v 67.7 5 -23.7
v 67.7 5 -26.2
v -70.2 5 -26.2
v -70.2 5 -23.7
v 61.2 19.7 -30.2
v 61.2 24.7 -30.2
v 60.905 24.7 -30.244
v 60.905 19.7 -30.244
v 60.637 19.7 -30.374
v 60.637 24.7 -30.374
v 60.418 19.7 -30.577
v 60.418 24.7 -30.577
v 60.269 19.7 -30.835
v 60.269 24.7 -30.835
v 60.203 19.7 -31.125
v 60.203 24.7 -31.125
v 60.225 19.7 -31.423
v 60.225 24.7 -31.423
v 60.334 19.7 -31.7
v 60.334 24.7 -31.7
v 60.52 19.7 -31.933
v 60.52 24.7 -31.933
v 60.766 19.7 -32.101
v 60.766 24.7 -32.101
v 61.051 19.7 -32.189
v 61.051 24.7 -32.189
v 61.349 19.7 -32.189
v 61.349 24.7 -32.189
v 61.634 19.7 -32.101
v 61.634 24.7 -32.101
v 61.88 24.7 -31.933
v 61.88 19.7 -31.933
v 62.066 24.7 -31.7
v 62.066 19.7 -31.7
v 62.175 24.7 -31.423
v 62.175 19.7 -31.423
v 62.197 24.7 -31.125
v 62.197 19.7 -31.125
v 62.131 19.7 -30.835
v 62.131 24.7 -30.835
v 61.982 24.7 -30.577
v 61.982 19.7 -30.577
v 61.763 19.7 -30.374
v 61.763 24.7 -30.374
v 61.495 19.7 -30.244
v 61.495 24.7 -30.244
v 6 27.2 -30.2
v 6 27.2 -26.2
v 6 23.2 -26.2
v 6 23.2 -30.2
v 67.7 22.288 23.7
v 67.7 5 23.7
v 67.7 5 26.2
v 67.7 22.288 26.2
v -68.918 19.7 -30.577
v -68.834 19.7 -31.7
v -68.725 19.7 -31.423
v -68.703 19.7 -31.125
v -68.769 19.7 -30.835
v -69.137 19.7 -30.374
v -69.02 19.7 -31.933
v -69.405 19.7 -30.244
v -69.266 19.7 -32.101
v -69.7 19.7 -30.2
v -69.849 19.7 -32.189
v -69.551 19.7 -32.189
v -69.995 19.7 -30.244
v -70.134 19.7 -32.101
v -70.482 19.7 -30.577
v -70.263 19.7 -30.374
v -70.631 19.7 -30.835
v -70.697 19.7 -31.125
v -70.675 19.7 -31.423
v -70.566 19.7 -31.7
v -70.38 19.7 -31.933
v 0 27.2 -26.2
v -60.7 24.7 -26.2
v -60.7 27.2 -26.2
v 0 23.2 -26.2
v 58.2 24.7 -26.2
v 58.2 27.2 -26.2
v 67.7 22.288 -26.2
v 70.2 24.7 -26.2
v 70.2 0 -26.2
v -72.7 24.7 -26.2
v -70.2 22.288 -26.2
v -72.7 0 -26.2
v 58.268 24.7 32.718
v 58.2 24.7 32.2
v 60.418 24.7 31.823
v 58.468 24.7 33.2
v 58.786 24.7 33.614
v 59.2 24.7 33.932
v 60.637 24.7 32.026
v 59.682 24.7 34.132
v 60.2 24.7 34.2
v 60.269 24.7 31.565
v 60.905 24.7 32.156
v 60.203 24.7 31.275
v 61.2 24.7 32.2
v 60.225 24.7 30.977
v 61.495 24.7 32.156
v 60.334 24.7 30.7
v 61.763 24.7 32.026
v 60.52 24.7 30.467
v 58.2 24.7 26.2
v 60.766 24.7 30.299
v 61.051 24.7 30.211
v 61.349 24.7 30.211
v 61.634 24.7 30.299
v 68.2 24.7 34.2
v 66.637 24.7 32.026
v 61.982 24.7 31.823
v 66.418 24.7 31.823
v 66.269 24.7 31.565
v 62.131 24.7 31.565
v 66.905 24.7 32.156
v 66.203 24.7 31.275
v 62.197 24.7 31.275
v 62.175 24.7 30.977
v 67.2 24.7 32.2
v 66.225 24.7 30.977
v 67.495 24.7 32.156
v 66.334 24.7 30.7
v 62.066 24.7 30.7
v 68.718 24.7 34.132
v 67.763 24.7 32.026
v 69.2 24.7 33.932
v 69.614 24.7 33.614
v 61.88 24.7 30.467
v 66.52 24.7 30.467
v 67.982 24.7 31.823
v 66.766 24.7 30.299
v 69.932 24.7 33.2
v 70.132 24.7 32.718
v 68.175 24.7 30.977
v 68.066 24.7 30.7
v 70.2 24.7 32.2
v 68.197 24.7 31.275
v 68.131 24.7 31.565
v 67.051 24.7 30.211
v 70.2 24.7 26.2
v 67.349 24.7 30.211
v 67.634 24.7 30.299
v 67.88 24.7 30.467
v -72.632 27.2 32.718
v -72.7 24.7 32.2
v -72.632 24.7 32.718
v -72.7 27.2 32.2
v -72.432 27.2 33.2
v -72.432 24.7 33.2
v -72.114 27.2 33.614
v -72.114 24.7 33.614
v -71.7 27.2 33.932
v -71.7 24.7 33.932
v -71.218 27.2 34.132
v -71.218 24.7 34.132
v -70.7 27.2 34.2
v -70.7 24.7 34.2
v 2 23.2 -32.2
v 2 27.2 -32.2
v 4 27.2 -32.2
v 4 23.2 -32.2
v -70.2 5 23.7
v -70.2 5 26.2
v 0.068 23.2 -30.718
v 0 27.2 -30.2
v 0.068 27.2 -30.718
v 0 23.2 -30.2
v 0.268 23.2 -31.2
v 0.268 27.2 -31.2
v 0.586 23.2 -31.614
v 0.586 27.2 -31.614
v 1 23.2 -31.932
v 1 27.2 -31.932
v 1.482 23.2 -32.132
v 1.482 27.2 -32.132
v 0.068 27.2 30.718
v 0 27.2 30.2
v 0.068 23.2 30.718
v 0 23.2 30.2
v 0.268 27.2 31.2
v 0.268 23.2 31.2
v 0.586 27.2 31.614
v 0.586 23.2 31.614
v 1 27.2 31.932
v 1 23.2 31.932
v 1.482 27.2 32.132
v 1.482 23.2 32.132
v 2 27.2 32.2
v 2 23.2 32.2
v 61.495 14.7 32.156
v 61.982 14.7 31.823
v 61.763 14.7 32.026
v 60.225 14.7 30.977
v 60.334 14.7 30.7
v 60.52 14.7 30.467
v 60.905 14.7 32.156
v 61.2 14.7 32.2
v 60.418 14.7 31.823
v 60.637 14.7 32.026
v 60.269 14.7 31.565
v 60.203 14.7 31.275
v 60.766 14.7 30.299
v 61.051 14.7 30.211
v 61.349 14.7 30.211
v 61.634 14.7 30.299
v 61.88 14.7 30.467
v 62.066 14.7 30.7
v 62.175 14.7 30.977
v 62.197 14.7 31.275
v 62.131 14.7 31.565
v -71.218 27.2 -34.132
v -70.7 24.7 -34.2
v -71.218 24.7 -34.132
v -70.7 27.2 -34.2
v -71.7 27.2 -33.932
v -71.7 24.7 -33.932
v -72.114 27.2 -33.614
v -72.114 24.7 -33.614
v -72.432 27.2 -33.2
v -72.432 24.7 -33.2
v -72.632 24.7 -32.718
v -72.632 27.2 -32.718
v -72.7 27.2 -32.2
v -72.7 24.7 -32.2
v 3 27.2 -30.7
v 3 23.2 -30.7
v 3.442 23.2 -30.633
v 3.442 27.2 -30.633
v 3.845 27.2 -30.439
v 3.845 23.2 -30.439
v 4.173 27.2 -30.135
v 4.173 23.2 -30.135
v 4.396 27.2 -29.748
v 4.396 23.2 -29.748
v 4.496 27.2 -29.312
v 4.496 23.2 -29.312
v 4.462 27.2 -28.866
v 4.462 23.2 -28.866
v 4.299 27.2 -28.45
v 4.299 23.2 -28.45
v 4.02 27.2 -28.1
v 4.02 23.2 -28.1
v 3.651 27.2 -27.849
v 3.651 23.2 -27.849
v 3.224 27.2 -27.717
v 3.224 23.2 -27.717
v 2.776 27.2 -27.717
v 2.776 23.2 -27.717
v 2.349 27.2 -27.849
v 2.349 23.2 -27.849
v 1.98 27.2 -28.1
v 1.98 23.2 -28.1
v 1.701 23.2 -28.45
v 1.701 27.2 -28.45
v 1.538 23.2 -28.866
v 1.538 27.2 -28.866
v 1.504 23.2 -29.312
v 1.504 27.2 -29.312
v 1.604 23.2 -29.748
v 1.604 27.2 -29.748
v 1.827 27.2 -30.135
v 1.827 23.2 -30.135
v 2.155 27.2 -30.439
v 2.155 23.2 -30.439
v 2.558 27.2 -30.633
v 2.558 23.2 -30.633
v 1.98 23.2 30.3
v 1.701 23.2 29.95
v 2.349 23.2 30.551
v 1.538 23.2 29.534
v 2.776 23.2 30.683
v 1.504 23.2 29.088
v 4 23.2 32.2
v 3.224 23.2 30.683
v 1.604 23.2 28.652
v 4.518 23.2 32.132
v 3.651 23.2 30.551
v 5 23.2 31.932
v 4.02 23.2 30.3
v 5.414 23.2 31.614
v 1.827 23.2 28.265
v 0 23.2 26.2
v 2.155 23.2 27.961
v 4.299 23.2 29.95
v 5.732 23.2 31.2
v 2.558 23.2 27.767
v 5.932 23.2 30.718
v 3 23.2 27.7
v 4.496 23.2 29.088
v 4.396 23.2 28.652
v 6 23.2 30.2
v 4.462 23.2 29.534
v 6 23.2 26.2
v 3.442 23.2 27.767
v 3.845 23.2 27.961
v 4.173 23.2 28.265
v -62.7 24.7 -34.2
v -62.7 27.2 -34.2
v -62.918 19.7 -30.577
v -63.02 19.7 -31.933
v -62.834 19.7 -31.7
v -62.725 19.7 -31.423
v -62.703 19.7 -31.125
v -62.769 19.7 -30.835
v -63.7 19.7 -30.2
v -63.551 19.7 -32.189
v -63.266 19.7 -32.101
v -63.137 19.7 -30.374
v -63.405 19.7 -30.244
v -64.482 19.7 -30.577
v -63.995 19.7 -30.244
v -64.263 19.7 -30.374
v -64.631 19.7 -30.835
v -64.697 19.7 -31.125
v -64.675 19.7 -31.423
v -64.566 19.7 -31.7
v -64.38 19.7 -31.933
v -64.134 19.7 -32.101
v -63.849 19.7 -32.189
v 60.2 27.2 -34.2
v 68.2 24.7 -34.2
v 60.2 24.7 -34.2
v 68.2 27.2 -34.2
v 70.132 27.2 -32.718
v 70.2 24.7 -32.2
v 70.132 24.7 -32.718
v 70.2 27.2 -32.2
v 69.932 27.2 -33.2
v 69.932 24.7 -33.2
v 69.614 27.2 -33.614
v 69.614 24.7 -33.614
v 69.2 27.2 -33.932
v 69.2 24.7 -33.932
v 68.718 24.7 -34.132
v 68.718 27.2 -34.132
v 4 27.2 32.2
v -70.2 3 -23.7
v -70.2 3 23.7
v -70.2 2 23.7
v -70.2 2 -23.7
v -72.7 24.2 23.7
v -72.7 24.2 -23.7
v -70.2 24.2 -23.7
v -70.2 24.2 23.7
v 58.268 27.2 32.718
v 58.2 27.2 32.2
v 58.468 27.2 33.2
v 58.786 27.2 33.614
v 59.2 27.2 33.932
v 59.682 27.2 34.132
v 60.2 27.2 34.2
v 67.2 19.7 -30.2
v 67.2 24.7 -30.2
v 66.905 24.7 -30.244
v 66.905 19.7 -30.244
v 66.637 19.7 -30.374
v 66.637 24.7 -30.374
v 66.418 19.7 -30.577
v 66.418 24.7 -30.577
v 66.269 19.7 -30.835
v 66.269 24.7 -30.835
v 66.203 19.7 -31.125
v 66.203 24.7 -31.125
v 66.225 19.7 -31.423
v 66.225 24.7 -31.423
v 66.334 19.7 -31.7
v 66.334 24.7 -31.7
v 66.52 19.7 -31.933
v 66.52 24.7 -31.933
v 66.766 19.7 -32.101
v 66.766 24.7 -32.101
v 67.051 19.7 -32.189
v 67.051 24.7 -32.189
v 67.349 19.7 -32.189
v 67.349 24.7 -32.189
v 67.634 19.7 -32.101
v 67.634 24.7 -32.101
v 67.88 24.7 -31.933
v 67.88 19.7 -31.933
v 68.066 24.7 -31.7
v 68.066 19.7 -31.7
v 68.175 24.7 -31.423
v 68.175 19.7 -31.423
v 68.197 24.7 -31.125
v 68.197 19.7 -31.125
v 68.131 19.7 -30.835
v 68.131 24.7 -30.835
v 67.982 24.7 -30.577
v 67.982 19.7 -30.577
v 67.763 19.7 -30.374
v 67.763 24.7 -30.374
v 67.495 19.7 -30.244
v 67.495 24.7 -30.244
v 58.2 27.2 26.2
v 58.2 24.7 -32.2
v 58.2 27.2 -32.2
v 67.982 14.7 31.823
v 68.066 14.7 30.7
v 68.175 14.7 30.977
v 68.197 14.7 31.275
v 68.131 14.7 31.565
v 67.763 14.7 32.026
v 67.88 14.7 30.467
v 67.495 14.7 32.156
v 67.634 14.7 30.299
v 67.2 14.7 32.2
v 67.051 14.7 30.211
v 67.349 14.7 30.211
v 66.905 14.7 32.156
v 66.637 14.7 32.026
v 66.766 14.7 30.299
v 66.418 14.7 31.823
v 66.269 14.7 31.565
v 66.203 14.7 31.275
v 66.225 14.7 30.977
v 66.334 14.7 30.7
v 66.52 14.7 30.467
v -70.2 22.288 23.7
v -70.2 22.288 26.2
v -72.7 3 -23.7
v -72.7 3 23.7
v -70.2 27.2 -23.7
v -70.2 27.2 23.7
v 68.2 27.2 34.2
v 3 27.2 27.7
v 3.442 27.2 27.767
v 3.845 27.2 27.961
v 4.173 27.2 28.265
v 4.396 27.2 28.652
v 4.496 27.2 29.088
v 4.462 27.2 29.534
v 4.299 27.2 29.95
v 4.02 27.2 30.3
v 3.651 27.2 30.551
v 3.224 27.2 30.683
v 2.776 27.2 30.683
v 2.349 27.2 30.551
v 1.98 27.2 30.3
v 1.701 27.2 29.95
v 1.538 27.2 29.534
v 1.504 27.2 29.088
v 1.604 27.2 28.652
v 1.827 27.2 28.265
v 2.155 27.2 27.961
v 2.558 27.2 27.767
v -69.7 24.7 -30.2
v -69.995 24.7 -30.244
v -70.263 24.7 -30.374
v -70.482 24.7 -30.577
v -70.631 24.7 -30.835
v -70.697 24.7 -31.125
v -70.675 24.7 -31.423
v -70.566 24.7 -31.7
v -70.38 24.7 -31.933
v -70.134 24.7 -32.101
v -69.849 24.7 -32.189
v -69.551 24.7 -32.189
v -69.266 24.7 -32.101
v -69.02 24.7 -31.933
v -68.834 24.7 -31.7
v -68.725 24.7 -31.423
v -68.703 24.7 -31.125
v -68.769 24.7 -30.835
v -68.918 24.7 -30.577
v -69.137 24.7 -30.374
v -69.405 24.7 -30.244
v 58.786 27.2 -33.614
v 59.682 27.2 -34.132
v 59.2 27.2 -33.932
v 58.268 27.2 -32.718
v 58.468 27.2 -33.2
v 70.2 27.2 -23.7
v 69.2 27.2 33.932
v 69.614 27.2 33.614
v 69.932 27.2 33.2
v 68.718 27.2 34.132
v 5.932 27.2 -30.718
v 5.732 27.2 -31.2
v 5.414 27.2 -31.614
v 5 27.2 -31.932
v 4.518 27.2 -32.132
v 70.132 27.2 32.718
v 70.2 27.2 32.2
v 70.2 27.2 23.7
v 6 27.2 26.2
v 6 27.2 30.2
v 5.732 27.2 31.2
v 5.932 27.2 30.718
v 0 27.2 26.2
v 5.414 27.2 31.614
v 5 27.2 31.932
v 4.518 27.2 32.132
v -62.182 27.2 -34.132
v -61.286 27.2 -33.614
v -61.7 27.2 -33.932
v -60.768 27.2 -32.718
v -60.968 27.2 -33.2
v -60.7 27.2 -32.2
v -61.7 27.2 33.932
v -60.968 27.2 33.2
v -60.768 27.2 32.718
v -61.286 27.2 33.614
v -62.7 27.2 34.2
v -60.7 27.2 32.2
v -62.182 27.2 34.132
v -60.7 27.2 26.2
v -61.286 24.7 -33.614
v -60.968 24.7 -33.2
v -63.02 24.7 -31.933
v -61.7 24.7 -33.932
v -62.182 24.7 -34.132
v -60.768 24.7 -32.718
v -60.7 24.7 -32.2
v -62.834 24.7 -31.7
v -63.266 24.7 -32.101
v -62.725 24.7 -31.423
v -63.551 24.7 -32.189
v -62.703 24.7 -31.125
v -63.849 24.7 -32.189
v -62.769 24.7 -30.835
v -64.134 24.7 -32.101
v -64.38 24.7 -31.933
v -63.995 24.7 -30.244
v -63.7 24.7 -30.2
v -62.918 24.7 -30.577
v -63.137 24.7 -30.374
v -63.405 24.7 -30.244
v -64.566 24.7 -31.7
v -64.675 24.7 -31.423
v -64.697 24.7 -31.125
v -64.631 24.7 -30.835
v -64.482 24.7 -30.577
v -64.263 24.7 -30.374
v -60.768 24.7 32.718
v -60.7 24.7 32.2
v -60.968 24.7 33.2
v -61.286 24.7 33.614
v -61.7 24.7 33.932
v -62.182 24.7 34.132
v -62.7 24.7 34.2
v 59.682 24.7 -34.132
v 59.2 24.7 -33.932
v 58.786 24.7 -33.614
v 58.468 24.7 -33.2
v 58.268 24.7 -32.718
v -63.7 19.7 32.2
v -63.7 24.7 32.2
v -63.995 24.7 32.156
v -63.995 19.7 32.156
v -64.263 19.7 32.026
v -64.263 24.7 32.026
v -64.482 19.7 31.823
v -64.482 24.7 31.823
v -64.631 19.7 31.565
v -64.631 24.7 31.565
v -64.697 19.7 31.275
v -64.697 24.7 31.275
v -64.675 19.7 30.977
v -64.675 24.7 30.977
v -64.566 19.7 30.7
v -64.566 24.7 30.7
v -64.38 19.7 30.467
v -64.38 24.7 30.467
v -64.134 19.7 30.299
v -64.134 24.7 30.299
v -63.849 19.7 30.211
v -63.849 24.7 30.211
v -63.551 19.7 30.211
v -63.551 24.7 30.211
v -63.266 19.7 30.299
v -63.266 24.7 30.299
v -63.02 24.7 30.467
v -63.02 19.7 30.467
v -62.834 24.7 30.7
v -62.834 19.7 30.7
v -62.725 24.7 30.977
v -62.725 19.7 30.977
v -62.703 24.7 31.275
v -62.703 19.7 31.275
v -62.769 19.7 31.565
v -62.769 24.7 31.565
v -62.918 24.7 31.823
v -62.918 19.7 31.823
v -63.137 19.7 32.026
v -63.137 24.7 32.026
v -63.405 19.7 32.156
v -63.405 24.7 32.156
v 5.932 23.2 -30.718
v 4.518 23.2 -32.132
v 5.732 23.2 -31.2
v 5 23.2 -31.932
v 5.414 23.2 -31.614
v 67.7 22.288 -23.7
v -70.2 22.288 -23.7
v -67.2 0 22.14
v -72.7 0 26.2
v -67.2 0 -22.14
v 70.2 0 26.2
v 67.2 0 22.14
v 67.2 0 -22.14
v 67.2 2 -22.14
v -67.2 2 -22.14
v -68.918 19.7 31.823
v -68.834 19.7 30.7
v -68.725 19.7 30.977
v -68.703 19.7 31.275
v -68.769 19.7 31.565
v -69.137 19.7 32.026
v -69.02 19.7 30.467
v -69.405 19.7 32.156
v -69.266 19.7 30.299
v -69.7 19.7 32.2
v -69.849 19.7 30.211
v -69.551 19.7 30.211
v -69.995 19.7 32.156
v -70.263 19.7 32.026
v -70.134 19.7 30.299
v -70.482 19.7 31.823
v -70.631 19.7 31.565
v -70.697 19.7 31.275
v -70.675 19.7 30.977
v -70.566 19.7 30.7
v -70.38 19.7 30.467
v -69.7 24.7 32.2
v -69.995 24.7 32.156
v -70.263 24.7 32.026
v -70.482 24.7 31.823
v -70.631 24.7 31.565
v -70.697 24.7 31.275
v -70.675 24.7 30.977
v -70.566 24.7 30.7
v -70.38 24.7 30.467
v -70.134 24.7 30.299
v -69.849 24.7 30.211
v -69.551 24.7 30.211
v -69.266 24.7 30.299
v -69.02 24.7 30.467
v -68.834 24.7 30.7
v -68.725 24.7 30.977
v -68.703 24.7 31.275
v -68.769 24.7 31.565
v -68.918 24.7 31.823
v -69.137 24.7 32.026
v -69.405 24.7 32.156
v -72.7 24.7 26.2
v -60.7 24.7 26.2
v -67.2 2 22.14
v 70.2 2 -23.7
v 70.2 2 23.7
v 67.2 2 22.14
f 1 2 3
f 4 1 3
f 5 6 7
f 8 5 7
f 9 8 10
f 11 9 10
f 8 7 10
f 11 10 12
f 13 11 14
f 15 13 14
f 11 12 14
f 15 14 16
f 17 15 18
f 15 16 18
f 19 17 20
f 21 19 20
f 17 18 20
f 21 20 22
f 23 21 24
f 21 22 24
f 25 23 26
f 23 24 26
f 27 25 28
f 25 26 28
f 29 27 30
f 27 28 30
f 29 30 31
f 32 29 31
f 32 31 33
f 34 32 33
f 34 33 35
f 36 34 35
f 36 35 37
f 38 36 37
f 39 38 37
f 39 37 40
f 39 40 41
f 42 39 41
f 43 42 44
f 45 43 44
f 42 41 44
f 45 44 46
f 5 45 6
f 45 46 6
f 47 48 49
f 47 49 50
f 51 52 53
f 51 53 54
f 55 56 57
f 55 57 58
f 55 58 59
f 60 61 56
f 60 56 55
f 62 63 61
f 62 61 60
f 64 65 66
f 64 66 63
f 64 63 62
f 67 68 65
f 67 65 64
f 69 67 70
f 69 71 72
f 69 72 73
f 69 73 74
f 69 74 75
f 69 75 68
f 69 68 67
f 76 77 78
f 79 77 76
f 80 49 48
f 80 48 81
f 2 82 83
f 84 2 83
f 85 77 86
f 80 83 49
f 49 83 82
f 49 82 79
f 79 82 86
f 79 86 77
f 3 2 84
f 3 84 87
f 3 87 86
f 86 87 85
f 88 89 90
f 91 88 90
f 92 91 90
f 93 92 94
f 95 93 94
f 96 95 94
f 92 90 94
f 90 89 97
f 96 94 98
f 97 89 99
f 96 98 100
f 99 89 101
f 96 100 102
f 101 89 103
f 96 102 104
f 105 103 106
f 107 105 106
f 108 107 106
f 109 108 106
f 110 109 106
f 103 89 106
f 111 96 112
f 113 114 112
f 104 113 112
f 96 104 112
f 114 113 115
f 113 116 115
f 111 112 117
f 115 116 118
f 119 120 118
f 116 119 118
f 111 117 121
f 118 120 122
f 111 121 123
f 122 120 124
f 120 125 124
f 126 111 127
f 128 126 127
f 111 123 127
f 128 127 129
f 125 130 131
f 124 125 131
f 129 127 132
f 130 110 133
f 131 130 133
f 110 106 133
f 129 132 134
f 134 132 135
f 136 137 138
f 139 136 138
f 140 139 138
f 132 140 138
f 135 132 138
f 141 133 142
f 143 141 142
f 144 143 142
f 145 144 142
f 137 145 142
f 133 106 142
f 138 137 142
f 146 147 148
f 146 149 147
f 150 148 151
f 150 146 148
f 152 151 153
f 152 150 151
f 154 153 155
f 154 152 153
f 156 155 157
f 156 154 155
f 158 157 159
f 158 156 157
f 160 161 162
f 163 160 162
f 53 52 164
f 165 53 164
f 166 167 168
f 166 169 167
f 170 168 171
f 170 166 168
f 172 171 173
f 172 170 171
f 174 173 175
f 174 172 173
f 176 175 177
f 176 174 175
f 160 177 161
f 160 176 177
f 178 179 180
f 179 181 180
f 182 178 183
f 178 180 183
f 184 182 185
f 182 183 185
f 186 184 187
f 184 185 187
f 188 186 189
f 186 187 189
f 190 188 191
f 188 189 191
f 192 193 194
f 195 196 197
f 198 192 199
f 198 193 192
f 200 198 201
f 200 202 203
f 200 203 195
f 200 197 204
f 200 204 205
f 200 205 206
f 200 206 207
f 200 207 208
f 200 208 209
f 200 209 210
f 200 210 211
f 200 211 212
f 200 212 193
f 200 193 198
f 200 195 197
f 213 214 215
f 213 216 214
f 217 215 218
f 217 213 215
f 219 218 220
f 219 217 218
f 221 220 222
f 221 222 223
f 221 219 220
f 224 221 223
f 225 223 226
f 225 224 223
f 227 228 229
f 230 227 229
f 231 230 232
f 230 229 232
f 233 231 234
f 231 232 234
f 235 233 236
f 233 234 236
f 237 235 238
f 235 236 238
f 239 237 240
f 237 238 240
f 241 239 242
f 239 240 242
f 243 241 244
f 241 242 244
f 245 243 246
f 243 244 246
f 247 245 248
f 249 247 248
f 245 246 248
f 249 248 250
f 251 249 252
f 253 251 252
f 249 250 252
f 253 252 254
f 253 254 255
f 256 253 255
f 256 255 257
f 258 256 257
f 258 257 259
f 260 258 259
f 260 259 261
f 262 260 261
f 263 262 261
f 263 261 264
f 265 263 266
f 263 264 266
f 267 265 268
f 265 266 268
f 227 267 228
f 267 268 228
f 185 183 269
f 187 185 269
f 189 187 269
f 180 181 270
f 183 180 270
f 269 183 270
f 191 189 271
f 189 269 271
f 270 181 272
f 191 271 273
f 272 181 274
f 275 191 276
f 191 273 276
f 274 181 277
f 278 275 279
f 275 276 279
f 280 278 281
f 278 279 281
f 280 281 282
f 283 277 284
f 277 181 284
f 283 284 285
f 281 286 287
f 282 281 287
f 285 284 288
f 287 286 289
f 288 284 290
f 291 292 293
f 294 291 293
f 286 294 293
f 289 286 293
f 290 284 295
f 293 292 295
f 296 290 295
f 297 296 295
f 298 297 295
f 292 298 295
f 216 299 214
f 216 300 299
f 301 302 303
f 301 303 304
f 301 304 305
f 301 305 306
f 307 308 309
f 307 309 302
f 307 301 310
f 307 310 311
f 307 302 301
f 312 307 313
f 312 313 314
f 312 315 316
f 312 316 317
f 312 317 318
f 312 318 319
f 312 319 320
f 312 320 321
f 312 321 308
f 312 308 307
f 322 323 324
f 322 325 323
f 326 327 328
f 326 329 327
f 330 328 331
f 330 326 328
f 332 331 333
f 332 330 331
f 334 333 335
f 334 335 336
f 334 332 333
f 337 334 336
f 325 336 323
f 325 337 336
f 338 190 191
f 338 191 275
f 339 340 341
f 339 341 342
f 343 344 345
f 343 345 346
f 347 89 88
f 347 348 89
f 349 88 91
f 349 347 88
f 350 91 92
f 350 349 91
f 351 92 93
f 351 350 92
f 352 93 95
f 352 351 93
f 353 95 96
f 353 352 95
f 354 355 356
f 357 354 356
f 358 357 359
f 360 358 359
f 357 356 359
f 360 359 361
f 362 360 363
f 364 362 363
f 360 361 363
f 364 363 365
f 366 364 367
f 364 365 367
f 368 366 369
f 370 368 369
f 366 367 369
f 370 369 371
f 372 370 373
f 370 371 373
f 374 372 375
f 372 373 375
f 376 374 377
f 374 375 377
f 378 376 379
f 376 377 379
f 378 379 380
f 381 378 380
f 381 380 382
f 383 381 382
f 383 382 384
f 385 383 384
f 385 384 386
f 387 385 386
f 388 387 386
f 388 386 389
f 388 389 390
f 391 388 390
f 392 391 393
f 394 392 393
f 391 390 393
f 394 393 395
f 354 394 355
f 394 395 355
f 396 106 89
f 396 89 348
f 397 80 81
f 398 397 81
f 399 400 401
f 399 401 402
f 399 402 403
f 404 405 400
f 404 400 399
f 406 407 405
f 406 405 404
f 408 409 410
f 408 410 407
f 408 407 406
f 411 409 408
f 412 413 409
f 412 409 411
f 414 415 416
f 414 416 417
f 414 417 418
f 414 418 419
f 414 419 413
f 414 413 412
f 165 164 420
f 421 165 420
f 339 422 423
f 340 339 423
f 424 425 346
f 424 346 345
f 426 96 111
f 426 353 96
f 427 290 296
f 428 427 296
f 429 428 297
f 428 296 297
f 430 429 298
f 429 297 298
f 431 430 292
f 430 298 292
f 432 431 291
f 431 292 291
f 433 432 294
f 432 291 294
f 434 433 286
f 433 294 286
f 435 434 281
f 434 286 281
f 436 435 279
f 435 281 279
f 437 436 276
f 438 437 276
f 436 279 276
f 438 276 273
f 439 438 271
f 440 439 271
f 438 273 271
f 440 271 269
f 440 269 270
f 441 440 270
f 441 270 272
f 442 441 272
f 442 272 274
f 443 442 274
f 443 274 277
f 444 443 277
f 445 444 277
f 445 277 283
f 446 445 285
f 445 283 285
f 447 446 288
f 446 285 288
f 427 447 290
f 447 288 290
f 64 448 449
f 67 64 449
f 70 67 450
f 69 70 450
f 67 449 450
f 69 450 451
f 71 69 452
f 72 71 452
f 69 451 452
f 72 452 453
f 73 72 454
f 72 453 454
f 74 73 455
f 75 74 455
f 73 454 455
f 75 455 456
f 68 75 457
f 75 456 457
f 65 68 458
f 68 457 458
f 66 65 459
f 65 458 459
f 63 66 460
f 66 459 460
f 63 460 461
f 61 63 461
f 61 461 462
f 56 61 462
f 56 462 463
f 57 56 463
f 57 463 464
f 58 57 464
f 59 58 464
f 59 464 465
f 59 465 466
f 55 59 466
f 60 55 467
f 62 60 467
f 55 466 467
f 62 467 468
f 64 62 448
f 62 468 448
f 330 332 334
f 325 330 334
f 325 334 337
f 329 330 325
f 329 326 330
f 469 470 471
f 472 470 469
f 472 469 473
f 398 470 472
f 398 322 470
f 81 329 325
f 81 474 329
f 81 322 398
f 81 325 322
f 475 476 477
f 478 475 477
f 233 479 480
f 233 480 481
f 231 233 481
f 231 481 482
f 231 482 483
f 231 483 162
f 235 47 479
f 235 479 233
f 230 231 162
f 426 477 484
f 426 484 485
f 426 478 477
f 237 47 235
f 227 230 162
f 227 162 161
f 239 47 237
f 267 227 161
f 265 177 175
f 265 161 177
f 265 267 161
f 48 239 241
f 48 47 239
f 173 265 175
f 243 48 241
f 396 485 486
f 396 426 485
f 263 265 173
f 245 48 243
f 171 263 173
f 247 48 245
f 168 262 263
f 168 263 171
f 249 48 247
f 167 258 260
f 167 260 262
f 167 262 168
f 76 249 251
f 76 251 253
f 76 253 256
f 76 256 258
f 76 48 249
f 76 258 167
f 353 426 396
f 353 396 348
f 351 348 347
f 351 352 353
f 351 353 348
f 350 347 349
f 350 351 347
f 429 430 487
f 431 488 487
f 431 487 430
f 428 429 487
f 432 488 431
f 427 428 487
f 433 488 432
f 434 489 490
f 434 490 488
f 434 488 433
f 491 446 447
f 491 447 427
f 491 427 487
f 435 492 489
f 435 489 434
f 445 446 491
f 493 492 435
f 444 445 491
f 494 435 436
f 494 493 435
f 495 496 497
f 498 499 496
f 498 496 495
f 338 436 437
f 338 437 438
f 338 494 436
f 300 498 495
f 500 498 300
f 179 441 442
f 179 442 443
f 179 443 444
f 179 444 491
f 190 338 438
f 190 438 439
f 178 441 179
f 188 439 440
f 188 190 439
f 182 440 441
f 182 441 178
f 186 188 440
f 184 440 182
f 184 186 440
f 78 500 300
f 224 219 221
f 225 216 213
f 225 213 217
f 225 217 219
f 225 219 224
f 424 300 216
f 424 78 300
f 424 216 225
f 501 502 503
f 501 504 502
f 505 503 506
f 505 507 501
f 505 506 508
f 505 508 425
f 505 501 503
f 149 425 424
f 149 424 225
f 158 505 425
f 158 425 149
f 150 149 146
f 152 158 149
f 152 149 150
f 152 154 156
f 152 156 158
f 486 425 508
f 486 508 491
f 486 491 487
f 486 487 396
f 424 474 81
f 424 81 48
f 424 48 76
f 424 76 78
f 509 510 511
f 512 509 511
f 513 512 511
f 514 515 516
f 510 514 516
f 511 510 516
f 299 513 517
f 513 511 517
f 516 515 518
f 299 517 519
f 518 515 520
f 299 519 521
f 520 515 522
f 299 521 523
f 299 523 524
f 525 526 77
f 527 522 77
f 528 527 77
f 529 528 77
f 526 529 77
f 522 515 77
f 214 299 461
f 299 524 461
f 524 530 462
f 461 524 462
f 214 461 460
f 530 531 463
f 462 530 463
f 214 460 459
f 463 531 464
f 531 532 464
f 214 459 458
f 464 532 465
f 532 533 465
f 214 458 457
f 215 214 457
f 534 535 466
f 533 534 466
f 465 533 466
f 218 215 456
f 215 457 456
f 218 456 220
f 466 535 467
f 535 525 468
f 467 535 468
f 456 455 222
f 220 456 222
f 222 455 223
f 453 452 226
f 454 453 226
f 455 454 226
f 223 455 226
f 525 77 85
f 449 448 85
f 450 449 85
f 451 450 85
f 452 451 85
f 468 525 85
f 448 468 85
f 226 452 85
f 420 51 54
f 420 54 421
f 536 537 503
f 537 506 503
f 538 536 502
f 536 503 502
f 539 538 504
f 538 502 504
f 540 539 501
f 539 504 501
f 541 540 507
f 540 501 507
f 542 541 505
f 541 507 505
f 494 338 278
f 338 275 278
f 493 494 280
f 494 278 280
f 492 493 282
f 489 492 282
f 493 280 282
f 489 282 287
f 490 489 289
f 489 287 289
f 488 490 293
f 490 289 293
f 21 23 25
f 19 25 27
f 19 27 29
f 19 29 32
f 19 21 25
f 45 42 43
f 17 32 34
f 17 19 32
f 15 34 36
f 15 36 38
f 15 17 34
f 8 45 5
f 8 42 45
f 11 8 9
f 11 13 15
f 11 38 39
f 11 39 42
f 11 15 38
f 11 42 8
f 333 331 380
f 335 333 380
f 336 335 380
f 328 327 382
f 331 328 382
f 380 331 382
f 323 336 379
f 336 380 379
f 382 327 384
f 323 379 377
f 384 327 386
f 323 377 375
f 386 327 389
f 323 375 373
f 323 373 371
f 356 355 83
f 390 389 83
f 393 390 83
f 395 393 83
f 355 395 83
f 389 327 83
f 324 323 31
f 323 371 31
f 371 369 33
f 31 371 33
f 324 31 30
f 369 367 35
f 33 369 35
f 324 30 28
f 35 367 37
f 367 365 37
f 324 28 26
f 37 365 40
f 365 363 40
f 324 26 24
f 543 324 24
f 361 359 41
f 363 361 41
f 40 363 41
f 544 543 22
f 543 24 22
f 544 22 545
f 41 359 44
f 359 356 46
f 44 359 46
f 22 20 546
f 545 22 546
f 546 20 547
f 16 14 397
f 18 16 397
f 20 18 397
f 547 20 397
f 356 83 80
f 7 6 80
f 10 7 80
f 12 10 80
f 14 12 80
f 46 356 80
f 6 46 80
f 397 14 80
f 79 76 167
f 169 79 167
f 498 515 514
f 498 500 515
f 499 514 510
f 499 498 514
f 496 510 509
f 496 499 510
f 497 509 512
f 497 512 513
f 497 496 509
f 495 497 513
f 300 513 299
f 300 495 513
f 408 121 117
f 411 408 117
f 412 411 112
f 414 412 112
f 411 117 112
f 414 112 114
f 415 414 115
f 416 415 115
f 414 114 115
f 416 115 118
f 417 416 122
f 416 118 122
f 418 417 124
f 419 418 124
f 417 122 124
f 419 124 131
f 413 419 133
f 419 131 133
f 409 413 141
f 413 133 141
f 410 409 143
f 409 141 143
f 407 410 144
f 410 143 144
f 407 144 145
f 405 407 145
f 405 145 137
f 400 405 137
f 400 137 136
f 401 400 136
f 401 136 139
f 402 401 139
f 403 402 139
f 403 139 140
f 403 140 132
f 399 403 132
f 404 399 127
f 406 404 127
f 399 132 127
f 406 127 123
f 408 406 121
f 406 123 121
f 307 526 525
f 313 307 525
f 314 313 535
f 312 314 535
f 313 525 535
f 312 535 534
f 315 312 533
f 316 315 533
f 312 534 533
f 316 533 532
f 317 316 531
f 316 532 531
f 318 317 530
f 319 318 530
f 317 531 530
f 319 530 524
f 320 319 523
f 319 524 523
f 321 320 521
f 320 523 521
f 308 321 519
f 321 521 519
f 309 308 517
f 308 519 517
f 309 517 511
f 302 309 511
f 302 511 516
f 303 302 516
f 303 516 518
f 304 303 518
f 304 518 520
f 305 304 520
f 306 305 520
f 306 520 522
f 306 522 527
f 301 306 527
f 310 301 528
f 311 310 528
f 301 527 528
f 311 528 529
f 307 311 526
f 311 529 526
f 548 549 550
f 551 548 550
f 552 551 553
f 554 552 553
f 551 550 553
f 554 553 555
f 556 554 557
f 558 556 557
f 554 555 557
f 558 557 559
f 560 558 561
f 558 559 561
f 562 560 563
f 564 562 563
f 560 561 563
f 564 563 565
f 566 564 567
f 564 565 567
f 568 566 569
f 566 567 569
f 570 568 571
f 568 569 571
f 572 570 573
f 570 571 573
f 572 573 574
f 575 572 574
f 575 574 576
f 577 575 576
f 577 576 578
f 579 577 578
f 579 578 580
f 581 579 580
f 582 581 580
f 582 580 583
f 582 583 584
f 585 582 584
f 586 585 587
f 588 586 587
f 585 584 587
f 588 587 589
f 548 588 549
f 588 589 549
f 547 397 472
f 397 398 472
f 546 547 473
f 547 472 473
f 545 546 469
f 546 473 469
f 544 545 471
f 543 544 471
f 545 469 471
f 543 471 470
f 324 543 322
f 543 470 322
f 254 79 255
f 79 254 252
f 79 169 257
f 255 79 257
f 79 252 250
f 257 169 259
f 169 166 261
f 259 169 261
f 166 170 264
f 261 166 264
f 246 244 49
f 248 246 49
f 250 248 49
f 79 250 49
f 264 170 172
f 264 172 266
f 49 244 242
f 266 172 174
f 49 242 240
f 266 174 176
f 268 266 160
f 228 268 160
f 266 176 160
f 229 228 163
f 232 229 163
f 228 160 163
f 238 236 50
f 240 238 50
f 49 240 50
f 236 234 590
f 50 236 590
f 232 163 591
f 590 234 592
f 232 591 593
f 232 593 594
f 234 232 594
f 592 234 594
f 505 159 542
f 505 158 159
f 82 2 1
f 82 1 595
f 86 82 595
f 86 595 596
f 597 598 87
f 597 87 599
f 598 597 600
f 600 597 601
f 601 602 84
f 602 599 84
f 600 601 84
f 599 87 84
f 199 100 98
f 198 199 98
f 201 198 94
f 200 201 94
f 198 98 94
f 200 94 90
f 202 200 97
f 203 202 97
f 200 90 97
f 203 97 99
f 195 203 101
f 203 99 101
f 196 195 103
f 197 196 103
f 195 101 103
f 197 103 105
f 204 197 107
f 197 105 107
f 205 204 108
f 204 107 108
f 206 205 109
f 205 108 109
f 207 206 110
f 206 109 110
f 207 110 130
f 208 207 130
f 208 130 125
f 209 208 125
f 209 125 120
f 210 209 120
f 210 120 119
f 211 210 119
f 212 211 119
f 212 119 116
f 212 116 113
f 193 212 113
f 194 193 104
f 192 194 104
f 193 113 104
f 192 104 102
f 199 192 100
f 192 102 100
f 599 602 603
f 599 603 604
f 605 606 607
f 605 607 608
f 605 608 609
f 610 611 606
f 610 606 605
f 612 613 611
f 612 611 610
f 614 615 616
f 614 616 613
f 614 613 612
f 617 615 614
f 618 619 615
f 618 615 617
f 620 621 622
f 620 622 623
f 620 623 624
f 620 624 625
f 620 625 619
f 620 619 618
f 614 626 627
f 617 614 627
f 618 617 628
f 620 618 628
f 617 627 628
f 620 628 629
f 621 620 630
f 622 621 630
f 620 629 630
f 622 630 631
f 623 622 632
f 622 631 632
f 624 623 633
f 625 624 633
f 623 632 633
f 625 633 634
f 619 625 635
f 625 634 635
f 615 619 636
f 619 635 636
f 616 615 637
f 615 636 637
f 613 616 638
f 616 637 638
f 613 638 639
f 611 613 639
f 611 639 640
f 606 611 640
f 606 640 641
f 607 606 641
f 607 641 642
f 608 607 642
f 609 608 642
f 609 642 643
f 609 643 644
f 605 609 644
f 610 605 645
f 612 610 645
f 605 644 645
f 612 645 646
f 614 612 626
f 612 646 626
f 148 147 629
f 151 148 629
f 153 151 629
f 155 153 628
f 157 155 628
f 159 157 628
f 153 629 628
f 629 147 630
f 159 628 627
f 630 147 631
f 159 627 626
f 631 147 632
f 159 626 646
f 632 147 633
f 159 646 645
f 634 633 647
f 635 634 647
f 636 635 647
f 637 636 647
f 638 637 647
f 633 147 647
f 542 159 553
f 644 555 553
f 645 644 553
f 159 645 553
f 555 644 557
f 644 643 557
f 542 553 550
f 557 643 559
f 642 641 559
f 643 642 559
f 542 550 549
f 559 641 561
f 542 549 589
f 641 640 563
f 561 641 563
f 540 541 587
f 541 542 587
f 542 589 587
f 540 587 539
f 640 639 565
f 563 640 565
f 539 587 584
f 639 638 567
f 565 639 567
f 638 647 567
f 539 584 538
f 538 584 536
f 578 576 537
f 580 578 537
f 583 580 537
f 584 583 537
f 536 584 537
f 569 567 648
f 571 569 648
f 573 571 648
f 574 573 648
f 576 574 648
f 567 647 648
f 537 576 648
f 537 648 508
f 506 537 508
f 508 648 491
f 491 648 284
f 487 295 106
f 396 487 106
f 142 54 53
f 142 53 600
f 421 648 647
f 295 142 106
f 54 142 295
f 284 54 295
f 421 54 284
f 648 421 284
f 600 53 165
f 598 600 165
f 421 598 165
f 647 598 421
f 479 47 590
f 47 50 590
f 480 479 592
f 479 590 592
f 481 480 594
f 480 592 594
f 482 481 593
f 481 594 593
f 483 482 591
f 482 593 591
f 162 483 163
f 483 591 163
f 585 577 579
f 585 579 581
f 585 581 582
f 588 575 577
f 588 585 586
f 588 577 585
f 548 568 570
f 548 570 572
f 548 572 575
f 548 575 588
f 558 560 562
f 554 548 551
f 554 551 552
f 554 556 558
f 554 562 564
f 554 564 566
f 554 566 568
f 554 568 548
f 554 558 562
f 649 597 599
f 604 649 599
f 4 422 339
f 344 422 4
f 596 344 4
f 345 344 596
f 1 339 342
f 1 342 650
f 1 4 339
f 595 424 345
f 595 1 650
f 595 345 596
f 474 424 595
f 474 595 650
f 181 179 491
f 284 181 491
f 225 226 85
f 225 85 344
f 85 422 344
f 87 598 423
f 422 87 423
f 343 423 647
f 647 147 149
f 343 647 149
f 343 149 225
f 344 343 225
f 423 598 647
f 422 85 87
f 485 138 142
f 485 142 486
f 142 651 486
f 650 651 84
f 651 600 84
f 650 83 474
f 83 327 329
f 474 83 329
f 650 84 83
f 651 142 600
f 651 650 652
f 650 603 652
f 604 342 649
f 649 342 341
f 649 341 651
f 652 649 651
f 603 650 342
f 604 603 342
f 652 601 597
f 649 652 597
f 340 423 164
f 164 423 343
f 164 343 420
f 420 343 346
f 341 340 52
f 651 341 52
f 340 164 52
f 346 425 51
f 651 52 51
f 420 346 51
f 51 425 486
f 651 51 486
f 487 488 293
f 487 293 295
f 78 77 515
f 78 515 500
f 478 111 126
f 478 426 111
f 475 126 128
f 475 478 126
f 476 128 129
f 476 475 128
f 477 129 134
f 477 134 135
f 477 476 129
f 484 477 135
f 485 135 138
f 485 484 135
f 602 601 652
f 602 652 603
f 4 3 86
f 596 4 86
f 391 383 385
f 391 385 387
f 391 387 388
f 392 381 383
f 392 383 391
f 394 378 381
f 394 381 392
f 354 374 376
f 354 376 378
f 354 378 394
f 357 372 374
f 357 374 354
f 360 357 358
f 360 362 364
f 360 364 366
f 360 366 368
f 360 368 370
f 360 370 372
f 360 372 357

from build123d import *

# Parameters (mm, degrees)
SKETCH1_W            = 145.4
SKETCH1_H            = 52.4
BOSS_EXTRUDE1_DEPTH  = 27.2
SKETCH2_W            = 140.4
SKETCH2_H            = 47.4
CUT_EXTRUDE1_DEPTH   = 25.2
SKETCH3_W            = 46.4
SKETCH3_H            = 25.2
CUT_EXTRUDE2_DEPTH   = 25.2
SKETCH4_W            = 6
SKETCH4_H            = 6
BOSS_EXTRUDE2_DEPTH  = 4
FILLET1_R            = 2
FILLET2_R            = 2
SKETCH7_R            = 1.5
CUT_EXTRUDE4_DEPTH   = 4
SKETCH8_W            = 2.5
SKETCH8_H            = 52.4
CUT_EXTRUDE5_DEPTH   = 43
SKETCH9_W            = 47.4
SKETCH9_H            = 21.2
CUT_EXTRUDE6_DEPTH   = 43
SKETCH11_W           = 137.9
SKETCH11_H           = 17.288060203
CUT_EXTRUDE7_DEPTH   = 59
SKETCH12_W           = 134.4
SKETCH12_H           = 44.280487354
CUT_EXTRUDE8_DEPTH   = 10
SKETCH16_W           = 12
SKETCH16_H           = 2.5
BOSS_EXTRUDE4_DEPTH  = 8
FILLET3_R            = 2
SKETCH17_R           = 1
BOSS_EXTRUDE5_DEPTH  = 5
SKETCH18_W           = 12
SKETCH18_H           = 2.5
BOSS_EXTRUDE6_DEPTH  = 8
FILLET4_R            = 2
SKETCH19_R           = 1
BOSS_EXTRUDE7_DEPTH  = 10
SKETCH20_W           = 12
SKETCH20_H           = 2.5
BOSS_EXTRUDE8_DEPTH  = 8
FILLET5_R            = 2
SKETCH21_R           = 1
BOSS_EXTRUDE9_DEPTH  = 5
SKETCH22_W           = 12
SKETCH22_H           = 2.5
BOSS_EXTRUDE10_DEPTH = 8
FILLET6_R            = 2
SKETCH23_R           = 1
BOSS_EXTRUDE11_DEPTH = 5


with BuildPart() as part:
    # Sketch1 → Boss-Extrude1 (new body)
    with BuildSketch(Plane(origin=(0, 0, 0), x_dir=(1, 0, 0), z_dir=(0, 1, 0))):
        Rectangle(SKETCH1_W, SKETCH1_H)
    extrude(amount=BOSS_EXTRUDE1_DEPTH)

    # Sketch2 → Cut-Extrude1 (cut)
    with BuildSketch(Plane(origin=(0, 27.2, 0), x_dir=(1, 0, 0), z_dir=(0, 1, 0))):
        Rectangle(SKETCH2_W, SKETCH2_H)
    extrude(amount=-CUT_EXTRUDE1_DEPTH, mode=Mode.SUBTRACT)

    # Sketch3 → Cut-Extrude2 (cut)
    with BuildSketch(Plane.ZY.offset(-70.2)):
        with Locations((0.5, 14.6)):
            Rectangle(SKETCH3_W, SKETCH3_H)
    extrude(amount=-CUT_EXTRUDE2_DEPTH, mode=Mode.SUBTRACT)

    # Sketch4 → Boss-Extrude2 (add)
    with BuildSketch(Plane(origin=(0, 27.2, 0), x_dir=(1, 0, 0), z_dir=(0, 1, 0))):
        with Locations((3, -29.2)):
            Rectangle(SKETCH4_W, SKETCH4_H)
        with Locations((3, 29.2)):
            Rectangle(SKETCH4_W, SKETCH4_H)
    extrude(amount=-BOSS_EXTRUDE2_DEPTH)

    # Fillet1
    fillet1_edges = [part.edges().sort_by_distance(p)[0] for p in [
        (0, 25.2, -32.2),
        (6, 25.2, -32.2),
    ]]
    fillet(fillet1_edges, radius=FILLET1_R)

    # Fillet2
    fillet2_edges = [part.edges().sort_by_distance(p)[0] for p in [
        (0, 25.2, 32.2),
        (6, 25.2, 32.2),
    ]]
    fillet(fillet2_edges, radius=FILLET2_R)

    # Sketch7 → Cut-Extrude4 (cut)
    with BuildSketch(Plane(origin=(0, 23.2, 0), x_dir=(-1, 0, 0), z_dir=(0, -1, 0))):
        with Locations(Location((-3, -29.2, 0), (0, 0, 90))):
            Circle(SKETCH7_R)
        with Locations(Location((-3, 29.2, 0), (0, 0, 90))):
            Circle(SKETCH7_R)
    extrude(amount=-CUT_EXTRUDE4_DEPTH, mode=Mode.SUBTRACT)

    # Sketch8 → Cut-Extrude5 (cut)
    with BuildSketch(Plane(origin=(0, 27.2, 0), x_dir=(1, 0, 0), z_dir=(0, 1, 0))):
        with Locations((71.45, 0)):
            Rectangle(SKETCH8_W, SKETCH8_H)
    extrude(amount=-CUT_EXTRUDE5_DEPTH, mode=Mode.SUBTRACT)

    # Sketch9 → Cut-Extrude6 (cut)
    with BuildSketch(Plane.ZY.offset(72.7)):
        with Locations((0, 13.6)):
            Rectangle(SKETCH9_W, SKETCH9_H)
    extrude(amount=-CUT_EXTRUDE6_DEPTH, mode=Mode.SUBTRACT)

    # Sketch11 → Cut-Extrude7 (cut)
    with BuildSketch(Plane(origin=(0, 0, -26.2), x_dir=(-1, 0, 0), z_dir=(0, 0, -1))):
        with Locations((1.25, 13.644030102)):
            Rectangle(SKETCH11_W, SKETCH11_H)
    extrude(amount=-CUT_EXTRUDE7_DEPTH, mode=Mode.SUBTRACT)

    # Sketch12 → Cut-Extrude8 (cut)
    with BuildSketch(Plane(origin=(0, 0, 0), x_dir=(-1, 0, 0), z_dir=(0, -1, 0))):
        Rectangle(SKETCH12_W, SKETCH12_H)
    extrude(amount=-CUT_EXTRUDE8_DEPTH, mode=Mode.SUBTRACT)

    # Sketch16 → Boss-Extrude4 (add)
    with BuildSketch(Plane(origin=(0, 0, -26.2), x_dir=(-1, 0, 0), z_dir=(0, 0, -1))):
        with Locations((-64.2, 25.95)):
            Rectangle(SKETCH16_W, SKETCH16_H)
    extrude(amount=BOSS_EXTRUDE4_DEPTH)

    # Fillet3
    fillet3_edges = [part.edges().sort_by_distance(p)[0] for p in [
        (70.2, 25.95, -34.2),
        (58.2, 25.95, -34.2),
    ]]
    fillet(fillet3_edges, radius=FILLET3_R)

    # Sketch17 → Boss-Extrude5 (add)
    with BuildSketch(Plane(origin=(0, 24.7, 0), x_dir=(-1, 0, 0), z_dir=(0, -1, 0))):
        with Locations(Location((-67.2, 31.2, 0), (0, 0, 270))):
            Circle(SKETCH17_R)
        with Locations(Location((-61.2, 31.2, 0), (0, 0, 270))):
            Circle(SKETCH17_R)
    extrude(amount=BOSS_EXTRUDE5_DEPTH)

    # Sketch18 → Boss-Extrude6 (add)
    with BuildSketch(Plane.XY.offset(26.2)):
        with Locations((64.2, 25.95)):
            Rectangle(SKETCH18_W, SKETCH18_H)
    extrude(amount=BOSS_EXTRUDE6_DEPTH)

    # Fillet4
    fillet4_edges = [part.edges().sort_by_distance(p)[0] for p in [
        (70.2, 25.95, 34.2),
        (58.2, 25.95, 34.2),
    ]]
    fillet(fillet4_edges, radius=FILLET4_R)

    # Sketch19 → Boss-Extrude7 (add)
    with BuildSketch(Plane(origin=(0, 24.7, 0), x_dir=(-1, 0, 0), z_dir=(0, -1, 0))):
        with Locations(Location((-67.2, -31.2, 0), (0, 0, 270))):
            Circle(SKETCH19_R)
        with Locations(Location((-61.2, -31.2, 0), (0, 0, 270))):
            Circle(SKETCH19_R)
    extrude(amount=BOSS_EXTRUDE7_DEPTH)

    # Sketch20 → Boss-Extrude8 (add)
    with BuildSketch(Plane.XY.offset(26.2)):
        with Locations((-66.7, 25.95)):
            Rectangle(SKETCH20_W, SKETCH20_H)
    extrude(amount=BOSS_EXTRUDE8_DEPTH)

    # Fillet5
    fillet5_edges = [part.edges().sort_by_distance(p)[0] for p in [
        (-72.7, 25.95, 34.2),
        (-60.7, 25.95, 34.2),
    ]]
    fillet(fillet5_edges, radius=FILLET5_R)

    # Sketch21 → Boss-Extrude9 (add)
    with BuildSketch(Plane(origin=(0, 24.7, 0), x_dir=(-1, 0, 0), z_dir=(0, -1, 0))):
        with Locations(Location((63.7, -31.2, 0), (0, 0, 270))):
            Circle(SKETCH21_R)
        with Locations(Location((69.7, -31.2, 0), (0, 0, 270))):
            Circle(SKETCH21_R)
    extrude(amount=BOSS_EXTRUDE9_DEPTH)

    # Sketch22 → Boss-Extrude10 (add)
    with BuildSketch(Plane(origin=(0, 0, -26.2), x_dir=(-1, 0, 0), z_dir=(0, 0, -1))):
        with Locations((66.7, 25.95)):
            Rectangle(SKETCH22_W, SKETCH22_H)
    extrude(amount=BOSS_EXTRUDE10_DEPTH)

    # Fillet6
    fillet6_edges = [part.edges().sort_by_distance(p)[0] for p in [
        (-72.7, 25.95, -34.2),
        (-60.7, 25.95, -34.2),
    ]]
    fillet(fillet6_edges, radius=FILLET6_R)

    # Sketch23 → Boss-Extrude11 (add)
    with BuildSketch(Plane(origin=(0, 24.7, 0), x_dir=(-1, 0, 0), z_dir=(0, -1, 0))):
        with Locations(Location((63.7, 31.2, 0), (0, 0, 270))):
            Circle(SKETCH23_R)
        with Locations(Location((69.7, 31.2, 0), (0, 0, 270))):
            Circle(SKETCH23_R)
    extrude(amount=BOSS_EXTRUDE11_DEPTH)


solid = part.part
